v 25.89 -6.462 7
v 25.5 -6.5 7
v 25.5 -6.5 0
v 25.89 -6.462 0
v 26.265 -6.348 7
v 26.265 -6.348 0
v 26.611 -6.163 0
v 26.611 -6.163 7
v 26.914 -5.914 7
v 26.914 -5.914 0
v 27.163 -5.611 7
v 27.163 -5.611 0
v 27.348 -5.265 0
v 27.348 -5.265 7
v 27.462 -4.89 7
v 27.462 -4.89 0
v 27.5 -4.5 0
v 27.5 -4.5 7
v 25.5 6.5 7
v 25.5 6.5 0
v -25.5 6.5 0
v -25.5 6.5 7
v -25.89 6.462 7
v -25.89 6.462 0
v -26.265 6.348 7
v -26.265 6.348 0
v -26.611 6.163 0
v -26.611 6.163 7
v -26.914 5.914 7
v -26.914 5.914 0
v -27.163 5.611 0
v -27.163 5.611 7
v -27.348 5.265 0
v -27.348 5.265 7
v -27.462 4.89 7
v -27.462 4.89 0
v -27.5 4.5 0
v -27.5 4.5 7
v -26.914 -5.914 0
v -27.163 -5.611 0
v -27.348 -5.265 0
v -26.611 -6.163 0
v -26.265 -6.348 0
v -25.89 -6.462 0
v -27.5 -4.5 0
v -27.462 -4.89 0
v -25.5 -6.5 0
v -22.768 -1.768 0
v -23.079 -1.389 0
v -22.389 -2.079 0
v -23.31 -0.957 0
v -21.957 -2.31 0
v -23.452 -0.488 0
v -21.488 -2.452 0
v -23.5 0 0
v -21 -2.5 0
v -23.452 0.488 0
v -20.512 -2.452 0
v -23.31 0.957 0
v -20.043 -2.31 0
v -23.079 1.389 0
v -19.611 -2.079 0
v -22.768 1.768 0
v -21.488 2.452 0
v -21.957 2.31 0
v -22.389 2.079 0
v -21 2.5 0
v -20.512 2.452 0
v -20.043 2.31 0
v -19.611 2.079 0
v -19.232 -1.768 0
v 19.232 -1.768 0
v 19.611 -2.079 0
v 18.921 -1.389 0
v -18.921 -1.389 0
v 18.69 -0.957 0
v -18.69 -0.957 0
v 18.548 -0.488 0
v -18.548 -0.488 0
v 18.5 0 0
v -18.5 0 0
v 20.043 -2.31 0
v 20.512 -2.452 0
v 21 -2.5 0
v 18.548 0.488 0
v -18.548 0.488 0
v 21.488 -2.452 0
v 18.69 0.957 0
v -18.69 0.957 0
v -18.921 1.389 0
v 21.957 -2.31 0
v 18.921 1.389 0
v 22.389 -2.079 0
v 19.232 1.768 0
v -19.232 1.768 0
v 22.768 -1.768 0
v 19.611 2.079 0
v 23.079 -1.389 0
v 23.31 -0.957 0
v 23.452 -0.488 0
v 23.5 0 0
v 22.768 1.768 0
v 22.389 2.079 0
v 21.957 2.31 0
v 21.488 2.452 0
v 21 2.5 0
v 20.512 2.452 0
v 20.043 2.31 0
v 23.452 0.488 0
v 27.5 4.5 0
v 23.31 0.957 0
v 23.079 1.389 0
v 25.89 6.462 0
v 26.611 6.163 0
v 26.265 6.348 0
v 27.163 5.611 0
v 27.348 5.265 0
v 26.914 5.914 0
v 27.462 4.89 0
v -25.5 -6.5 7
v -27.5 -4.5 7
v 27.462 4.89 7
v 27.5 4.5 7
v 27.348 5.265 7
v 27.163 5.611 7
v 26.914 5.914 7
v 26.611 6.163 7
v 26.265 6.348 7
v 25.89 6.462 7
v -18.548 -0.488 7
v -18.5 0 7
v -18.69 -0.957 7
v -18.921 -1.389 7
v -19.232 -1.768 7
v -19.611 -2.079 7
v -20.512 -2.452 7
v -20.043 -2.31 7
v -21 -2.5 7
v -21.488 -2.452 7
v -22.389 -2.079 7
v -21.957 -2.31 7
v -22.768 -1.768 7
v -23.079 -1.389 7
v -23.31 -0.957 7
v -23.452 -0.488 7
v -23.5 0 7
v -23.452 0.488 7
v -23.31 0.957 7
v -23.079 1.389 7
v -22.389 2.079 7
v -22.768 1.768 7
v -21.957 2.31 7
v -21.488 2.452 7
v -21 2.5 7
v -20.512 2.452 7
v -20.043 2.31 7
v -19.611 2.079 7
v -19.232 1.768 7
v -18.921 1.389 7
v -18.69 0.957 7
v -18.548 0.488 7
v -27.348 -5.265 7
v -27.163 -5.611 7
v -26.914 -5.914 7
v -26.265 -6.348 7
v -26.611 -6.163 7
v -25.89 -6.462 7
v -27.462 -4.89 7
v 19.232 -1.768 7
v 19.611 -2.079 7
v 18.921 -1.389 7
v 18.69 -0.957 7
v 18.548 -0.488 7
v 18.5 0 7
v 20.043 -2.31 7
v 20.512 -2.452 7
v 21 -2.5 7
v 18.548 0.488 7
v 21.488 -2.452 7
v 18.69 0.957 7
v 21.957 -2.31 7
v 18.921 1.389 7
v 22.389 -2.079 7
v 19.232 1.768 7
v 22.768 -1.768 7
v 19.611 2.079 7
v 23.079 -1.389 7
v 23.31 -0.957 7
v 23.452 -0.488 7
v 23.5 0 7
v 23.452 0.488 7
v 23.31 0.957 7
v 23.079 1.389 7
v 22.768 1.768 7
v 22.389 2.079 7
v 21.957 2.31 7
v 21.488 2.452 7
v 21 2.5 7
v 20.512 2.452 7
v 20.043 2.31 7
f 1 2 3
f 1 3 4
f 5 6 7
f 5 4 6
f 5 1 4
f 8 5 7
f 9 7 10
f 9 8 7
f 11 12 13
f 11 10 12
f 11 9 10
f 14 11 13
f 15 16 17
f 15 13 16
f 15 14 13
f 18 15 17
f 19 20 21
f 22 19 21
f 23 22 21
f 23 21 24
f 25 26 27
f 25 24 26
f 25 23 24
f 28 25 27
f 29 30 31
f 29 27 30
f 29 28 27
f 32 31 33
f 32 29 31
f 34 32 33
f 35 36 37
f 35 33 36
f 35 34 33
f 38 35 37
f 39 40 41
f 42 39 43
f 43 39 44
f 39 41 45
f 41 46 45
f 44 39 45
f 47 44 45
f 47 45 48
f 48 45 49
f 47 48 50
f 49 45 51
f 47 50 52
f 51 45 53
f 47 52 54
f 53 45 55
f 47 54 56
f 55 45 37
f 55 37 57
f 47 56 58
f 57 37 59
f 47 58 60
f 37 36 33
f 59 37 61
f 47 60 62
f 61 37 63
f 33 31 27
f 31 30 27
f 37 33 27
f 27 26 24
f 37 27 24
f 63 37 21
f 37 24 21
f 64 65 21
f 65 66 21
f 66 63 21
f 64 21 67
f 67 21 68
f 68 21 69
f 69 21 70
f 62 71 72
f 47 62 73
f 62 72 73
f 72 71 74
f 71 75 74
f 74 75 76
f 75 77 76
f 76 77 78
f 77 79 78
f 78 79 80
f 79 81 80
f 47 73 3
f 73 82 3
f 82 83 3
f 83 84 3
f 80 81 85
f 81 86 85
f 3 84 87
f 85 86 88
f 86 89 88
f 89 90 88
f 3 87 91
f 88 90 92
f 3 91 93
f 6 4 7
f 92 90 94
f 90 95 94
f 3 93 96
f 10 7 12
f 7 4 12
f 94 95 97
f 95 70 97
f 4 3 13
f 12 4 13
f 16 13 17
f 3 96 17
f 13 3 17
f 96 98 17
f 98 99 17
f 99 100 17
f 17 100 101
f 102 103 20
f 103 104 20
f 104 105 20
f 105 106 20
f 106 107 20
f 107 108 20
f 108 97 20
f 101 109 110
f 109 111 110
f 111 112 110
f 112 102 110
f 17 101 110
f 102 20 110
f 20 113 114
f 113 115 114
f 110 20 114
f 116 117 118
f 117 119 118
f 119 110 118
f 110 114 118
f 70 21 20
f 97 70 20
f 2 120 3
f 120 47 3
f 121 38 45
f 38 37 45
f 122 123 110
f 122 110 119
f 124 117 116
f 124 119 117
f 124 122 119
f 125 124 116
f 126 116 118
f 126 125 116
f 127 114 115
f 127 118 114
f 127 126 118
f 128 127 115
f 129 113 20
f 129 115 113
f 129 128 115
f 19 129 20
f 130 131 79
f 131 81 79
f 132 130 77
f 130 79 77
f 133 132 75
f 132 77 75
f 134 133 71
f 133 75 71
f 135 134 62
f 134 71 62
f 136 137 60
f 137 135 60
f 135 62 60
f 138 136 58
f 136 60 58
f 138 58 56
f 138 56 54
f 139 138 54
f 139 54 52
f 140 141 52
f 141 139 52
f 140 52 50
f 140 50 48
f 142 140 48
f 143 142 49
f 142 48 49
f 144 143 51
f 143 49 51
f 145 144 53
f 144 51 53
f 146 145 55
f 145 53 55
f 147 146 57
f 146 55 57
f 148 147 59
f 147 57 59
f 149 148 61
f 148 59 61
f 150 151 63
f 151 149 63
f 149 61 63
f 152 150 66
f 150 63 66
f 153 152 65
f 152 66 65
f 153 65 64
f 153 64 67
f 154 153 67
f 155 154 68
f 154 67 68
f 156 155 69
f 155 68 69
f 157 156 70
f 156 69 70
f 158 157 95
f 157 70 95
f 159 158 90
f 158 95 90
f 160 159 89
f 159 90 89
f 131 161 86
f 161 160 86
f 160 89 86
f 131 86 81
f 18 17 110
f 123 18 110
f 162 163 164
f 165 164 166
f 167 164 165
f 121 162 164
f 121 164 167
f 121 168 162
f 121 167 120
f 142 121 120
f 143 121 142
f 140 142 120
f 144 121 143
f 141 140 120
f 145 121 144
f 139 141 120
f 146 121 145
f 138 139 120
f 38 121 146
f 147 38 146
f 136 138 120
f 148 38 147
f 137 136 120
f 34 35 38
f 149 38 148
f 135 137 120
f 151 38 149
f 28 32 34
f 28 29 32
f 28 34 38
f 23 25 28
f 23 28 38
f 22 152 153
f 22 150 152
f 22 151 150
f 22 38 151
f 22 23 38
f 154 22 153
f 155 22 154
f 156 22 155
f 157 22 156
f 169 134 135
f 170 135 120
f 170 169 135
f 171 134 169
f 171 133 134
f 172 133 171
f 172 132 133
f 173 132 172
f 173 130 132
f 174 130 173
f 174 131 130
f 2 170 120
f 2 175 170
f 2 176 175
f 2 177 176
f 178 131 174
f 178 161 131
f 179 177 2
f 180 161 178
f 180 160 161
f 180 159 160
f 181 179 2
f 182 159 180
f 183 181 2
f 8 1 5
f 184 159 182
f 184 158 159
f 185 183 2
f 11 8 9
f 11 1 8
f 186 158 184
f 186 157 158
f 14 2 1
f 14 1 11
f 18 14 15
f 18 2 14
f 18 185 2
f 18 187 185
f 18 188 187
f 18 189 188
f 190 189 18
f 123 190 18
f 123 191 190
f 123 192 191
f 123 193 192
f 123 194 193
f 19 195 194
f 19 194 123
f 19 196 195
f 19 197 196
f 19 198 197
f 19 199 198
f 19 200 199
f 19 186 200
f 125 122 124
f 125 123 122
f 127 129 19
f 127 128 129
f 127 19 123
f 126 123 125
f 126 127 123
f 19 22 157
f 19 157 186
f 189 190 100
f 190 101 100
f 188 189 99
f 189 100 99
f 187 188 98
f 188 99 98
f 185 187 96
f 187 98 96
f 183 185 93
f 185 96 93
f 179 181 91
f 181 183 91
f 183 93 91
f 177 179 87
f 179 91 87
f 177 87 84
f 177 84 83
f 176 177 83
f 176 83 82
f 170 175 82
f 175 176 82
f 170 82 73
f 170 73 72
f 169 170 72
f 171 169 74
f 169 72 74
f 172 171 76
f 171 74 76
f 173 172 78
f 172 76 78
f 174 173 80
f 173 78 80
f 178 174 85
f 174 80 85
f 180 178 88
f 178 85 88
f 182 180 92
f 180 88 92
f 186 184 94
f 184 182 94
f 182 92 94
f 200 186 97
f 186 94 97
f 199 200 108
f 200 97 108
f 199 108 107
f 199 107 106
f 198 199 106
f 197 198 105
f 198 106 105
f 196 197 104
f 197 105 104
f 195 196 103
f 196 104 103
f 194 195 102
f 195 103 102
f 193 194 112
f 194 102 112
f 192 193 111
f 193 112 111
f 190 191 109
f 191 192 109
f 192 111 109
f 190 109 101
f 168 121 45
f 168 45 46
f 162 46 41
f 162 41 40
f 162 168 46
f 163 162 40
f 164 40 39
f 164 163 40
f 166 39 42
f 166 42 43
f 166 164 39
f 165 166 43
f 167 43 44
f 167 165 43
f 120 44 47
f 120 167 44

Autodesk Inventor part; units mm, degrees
ref_plane "YZ Plane" through (0, 0, 0) normal (1, 0, 0) x (0, 1, 0)
ref_plane "XZ Plane" through (0, 0, 0) normal (0, 1, 0) x (-1, 0, 0)
ref_plane "XY Plane" through (0, 0, 0) normal (0, 0, 1) x (1, 0, 0)
sketch "Sketch1" plane through (0, 0, 0) normal (0, 0, 1) x (1, 0, 0)
  line L0 (-27.5, -6.5) -> (27.5, -6.5)
  line L1 (27.5, -6.5) -> (27.5, 6.5)
  line L2 (27.5, 6.5) -> (-27.5, 6.5)
  line L3 (-27.5, 6.5) -> (-27.5, -6.5)
  line L4 (-27.5, -6.5) -> (27.5, 6.5) construction
  line L5 (27.5, -6.5) -> (-27.5, 6.5) construction
  circle A0 centre (-21, 0) radius 2.5
  circle A1 centre (21, 0) radius 2.5
  point P0 (0, 0)
  dimension "d0" = 55
  dimension "d1" = 13
  dimension "d2" = 5
  dimension "d3" = 5
  dimension "d4" = 42
  dimension "d5" = 21
  dimension "d6" = 6.5
  dimension "d7" = 6.5
extrude "Extrusion1" add sketch "Sketch1" along normal blind 7
fillet "Fillet1" radius 2 4 edges at (27.5, 6.5, 3.5) (27.5, -6.5, 3.5) (-27.5, 6.5, 3.5) (-27.5, -6.5, 3.5)
properties part number "dem bac dan"
